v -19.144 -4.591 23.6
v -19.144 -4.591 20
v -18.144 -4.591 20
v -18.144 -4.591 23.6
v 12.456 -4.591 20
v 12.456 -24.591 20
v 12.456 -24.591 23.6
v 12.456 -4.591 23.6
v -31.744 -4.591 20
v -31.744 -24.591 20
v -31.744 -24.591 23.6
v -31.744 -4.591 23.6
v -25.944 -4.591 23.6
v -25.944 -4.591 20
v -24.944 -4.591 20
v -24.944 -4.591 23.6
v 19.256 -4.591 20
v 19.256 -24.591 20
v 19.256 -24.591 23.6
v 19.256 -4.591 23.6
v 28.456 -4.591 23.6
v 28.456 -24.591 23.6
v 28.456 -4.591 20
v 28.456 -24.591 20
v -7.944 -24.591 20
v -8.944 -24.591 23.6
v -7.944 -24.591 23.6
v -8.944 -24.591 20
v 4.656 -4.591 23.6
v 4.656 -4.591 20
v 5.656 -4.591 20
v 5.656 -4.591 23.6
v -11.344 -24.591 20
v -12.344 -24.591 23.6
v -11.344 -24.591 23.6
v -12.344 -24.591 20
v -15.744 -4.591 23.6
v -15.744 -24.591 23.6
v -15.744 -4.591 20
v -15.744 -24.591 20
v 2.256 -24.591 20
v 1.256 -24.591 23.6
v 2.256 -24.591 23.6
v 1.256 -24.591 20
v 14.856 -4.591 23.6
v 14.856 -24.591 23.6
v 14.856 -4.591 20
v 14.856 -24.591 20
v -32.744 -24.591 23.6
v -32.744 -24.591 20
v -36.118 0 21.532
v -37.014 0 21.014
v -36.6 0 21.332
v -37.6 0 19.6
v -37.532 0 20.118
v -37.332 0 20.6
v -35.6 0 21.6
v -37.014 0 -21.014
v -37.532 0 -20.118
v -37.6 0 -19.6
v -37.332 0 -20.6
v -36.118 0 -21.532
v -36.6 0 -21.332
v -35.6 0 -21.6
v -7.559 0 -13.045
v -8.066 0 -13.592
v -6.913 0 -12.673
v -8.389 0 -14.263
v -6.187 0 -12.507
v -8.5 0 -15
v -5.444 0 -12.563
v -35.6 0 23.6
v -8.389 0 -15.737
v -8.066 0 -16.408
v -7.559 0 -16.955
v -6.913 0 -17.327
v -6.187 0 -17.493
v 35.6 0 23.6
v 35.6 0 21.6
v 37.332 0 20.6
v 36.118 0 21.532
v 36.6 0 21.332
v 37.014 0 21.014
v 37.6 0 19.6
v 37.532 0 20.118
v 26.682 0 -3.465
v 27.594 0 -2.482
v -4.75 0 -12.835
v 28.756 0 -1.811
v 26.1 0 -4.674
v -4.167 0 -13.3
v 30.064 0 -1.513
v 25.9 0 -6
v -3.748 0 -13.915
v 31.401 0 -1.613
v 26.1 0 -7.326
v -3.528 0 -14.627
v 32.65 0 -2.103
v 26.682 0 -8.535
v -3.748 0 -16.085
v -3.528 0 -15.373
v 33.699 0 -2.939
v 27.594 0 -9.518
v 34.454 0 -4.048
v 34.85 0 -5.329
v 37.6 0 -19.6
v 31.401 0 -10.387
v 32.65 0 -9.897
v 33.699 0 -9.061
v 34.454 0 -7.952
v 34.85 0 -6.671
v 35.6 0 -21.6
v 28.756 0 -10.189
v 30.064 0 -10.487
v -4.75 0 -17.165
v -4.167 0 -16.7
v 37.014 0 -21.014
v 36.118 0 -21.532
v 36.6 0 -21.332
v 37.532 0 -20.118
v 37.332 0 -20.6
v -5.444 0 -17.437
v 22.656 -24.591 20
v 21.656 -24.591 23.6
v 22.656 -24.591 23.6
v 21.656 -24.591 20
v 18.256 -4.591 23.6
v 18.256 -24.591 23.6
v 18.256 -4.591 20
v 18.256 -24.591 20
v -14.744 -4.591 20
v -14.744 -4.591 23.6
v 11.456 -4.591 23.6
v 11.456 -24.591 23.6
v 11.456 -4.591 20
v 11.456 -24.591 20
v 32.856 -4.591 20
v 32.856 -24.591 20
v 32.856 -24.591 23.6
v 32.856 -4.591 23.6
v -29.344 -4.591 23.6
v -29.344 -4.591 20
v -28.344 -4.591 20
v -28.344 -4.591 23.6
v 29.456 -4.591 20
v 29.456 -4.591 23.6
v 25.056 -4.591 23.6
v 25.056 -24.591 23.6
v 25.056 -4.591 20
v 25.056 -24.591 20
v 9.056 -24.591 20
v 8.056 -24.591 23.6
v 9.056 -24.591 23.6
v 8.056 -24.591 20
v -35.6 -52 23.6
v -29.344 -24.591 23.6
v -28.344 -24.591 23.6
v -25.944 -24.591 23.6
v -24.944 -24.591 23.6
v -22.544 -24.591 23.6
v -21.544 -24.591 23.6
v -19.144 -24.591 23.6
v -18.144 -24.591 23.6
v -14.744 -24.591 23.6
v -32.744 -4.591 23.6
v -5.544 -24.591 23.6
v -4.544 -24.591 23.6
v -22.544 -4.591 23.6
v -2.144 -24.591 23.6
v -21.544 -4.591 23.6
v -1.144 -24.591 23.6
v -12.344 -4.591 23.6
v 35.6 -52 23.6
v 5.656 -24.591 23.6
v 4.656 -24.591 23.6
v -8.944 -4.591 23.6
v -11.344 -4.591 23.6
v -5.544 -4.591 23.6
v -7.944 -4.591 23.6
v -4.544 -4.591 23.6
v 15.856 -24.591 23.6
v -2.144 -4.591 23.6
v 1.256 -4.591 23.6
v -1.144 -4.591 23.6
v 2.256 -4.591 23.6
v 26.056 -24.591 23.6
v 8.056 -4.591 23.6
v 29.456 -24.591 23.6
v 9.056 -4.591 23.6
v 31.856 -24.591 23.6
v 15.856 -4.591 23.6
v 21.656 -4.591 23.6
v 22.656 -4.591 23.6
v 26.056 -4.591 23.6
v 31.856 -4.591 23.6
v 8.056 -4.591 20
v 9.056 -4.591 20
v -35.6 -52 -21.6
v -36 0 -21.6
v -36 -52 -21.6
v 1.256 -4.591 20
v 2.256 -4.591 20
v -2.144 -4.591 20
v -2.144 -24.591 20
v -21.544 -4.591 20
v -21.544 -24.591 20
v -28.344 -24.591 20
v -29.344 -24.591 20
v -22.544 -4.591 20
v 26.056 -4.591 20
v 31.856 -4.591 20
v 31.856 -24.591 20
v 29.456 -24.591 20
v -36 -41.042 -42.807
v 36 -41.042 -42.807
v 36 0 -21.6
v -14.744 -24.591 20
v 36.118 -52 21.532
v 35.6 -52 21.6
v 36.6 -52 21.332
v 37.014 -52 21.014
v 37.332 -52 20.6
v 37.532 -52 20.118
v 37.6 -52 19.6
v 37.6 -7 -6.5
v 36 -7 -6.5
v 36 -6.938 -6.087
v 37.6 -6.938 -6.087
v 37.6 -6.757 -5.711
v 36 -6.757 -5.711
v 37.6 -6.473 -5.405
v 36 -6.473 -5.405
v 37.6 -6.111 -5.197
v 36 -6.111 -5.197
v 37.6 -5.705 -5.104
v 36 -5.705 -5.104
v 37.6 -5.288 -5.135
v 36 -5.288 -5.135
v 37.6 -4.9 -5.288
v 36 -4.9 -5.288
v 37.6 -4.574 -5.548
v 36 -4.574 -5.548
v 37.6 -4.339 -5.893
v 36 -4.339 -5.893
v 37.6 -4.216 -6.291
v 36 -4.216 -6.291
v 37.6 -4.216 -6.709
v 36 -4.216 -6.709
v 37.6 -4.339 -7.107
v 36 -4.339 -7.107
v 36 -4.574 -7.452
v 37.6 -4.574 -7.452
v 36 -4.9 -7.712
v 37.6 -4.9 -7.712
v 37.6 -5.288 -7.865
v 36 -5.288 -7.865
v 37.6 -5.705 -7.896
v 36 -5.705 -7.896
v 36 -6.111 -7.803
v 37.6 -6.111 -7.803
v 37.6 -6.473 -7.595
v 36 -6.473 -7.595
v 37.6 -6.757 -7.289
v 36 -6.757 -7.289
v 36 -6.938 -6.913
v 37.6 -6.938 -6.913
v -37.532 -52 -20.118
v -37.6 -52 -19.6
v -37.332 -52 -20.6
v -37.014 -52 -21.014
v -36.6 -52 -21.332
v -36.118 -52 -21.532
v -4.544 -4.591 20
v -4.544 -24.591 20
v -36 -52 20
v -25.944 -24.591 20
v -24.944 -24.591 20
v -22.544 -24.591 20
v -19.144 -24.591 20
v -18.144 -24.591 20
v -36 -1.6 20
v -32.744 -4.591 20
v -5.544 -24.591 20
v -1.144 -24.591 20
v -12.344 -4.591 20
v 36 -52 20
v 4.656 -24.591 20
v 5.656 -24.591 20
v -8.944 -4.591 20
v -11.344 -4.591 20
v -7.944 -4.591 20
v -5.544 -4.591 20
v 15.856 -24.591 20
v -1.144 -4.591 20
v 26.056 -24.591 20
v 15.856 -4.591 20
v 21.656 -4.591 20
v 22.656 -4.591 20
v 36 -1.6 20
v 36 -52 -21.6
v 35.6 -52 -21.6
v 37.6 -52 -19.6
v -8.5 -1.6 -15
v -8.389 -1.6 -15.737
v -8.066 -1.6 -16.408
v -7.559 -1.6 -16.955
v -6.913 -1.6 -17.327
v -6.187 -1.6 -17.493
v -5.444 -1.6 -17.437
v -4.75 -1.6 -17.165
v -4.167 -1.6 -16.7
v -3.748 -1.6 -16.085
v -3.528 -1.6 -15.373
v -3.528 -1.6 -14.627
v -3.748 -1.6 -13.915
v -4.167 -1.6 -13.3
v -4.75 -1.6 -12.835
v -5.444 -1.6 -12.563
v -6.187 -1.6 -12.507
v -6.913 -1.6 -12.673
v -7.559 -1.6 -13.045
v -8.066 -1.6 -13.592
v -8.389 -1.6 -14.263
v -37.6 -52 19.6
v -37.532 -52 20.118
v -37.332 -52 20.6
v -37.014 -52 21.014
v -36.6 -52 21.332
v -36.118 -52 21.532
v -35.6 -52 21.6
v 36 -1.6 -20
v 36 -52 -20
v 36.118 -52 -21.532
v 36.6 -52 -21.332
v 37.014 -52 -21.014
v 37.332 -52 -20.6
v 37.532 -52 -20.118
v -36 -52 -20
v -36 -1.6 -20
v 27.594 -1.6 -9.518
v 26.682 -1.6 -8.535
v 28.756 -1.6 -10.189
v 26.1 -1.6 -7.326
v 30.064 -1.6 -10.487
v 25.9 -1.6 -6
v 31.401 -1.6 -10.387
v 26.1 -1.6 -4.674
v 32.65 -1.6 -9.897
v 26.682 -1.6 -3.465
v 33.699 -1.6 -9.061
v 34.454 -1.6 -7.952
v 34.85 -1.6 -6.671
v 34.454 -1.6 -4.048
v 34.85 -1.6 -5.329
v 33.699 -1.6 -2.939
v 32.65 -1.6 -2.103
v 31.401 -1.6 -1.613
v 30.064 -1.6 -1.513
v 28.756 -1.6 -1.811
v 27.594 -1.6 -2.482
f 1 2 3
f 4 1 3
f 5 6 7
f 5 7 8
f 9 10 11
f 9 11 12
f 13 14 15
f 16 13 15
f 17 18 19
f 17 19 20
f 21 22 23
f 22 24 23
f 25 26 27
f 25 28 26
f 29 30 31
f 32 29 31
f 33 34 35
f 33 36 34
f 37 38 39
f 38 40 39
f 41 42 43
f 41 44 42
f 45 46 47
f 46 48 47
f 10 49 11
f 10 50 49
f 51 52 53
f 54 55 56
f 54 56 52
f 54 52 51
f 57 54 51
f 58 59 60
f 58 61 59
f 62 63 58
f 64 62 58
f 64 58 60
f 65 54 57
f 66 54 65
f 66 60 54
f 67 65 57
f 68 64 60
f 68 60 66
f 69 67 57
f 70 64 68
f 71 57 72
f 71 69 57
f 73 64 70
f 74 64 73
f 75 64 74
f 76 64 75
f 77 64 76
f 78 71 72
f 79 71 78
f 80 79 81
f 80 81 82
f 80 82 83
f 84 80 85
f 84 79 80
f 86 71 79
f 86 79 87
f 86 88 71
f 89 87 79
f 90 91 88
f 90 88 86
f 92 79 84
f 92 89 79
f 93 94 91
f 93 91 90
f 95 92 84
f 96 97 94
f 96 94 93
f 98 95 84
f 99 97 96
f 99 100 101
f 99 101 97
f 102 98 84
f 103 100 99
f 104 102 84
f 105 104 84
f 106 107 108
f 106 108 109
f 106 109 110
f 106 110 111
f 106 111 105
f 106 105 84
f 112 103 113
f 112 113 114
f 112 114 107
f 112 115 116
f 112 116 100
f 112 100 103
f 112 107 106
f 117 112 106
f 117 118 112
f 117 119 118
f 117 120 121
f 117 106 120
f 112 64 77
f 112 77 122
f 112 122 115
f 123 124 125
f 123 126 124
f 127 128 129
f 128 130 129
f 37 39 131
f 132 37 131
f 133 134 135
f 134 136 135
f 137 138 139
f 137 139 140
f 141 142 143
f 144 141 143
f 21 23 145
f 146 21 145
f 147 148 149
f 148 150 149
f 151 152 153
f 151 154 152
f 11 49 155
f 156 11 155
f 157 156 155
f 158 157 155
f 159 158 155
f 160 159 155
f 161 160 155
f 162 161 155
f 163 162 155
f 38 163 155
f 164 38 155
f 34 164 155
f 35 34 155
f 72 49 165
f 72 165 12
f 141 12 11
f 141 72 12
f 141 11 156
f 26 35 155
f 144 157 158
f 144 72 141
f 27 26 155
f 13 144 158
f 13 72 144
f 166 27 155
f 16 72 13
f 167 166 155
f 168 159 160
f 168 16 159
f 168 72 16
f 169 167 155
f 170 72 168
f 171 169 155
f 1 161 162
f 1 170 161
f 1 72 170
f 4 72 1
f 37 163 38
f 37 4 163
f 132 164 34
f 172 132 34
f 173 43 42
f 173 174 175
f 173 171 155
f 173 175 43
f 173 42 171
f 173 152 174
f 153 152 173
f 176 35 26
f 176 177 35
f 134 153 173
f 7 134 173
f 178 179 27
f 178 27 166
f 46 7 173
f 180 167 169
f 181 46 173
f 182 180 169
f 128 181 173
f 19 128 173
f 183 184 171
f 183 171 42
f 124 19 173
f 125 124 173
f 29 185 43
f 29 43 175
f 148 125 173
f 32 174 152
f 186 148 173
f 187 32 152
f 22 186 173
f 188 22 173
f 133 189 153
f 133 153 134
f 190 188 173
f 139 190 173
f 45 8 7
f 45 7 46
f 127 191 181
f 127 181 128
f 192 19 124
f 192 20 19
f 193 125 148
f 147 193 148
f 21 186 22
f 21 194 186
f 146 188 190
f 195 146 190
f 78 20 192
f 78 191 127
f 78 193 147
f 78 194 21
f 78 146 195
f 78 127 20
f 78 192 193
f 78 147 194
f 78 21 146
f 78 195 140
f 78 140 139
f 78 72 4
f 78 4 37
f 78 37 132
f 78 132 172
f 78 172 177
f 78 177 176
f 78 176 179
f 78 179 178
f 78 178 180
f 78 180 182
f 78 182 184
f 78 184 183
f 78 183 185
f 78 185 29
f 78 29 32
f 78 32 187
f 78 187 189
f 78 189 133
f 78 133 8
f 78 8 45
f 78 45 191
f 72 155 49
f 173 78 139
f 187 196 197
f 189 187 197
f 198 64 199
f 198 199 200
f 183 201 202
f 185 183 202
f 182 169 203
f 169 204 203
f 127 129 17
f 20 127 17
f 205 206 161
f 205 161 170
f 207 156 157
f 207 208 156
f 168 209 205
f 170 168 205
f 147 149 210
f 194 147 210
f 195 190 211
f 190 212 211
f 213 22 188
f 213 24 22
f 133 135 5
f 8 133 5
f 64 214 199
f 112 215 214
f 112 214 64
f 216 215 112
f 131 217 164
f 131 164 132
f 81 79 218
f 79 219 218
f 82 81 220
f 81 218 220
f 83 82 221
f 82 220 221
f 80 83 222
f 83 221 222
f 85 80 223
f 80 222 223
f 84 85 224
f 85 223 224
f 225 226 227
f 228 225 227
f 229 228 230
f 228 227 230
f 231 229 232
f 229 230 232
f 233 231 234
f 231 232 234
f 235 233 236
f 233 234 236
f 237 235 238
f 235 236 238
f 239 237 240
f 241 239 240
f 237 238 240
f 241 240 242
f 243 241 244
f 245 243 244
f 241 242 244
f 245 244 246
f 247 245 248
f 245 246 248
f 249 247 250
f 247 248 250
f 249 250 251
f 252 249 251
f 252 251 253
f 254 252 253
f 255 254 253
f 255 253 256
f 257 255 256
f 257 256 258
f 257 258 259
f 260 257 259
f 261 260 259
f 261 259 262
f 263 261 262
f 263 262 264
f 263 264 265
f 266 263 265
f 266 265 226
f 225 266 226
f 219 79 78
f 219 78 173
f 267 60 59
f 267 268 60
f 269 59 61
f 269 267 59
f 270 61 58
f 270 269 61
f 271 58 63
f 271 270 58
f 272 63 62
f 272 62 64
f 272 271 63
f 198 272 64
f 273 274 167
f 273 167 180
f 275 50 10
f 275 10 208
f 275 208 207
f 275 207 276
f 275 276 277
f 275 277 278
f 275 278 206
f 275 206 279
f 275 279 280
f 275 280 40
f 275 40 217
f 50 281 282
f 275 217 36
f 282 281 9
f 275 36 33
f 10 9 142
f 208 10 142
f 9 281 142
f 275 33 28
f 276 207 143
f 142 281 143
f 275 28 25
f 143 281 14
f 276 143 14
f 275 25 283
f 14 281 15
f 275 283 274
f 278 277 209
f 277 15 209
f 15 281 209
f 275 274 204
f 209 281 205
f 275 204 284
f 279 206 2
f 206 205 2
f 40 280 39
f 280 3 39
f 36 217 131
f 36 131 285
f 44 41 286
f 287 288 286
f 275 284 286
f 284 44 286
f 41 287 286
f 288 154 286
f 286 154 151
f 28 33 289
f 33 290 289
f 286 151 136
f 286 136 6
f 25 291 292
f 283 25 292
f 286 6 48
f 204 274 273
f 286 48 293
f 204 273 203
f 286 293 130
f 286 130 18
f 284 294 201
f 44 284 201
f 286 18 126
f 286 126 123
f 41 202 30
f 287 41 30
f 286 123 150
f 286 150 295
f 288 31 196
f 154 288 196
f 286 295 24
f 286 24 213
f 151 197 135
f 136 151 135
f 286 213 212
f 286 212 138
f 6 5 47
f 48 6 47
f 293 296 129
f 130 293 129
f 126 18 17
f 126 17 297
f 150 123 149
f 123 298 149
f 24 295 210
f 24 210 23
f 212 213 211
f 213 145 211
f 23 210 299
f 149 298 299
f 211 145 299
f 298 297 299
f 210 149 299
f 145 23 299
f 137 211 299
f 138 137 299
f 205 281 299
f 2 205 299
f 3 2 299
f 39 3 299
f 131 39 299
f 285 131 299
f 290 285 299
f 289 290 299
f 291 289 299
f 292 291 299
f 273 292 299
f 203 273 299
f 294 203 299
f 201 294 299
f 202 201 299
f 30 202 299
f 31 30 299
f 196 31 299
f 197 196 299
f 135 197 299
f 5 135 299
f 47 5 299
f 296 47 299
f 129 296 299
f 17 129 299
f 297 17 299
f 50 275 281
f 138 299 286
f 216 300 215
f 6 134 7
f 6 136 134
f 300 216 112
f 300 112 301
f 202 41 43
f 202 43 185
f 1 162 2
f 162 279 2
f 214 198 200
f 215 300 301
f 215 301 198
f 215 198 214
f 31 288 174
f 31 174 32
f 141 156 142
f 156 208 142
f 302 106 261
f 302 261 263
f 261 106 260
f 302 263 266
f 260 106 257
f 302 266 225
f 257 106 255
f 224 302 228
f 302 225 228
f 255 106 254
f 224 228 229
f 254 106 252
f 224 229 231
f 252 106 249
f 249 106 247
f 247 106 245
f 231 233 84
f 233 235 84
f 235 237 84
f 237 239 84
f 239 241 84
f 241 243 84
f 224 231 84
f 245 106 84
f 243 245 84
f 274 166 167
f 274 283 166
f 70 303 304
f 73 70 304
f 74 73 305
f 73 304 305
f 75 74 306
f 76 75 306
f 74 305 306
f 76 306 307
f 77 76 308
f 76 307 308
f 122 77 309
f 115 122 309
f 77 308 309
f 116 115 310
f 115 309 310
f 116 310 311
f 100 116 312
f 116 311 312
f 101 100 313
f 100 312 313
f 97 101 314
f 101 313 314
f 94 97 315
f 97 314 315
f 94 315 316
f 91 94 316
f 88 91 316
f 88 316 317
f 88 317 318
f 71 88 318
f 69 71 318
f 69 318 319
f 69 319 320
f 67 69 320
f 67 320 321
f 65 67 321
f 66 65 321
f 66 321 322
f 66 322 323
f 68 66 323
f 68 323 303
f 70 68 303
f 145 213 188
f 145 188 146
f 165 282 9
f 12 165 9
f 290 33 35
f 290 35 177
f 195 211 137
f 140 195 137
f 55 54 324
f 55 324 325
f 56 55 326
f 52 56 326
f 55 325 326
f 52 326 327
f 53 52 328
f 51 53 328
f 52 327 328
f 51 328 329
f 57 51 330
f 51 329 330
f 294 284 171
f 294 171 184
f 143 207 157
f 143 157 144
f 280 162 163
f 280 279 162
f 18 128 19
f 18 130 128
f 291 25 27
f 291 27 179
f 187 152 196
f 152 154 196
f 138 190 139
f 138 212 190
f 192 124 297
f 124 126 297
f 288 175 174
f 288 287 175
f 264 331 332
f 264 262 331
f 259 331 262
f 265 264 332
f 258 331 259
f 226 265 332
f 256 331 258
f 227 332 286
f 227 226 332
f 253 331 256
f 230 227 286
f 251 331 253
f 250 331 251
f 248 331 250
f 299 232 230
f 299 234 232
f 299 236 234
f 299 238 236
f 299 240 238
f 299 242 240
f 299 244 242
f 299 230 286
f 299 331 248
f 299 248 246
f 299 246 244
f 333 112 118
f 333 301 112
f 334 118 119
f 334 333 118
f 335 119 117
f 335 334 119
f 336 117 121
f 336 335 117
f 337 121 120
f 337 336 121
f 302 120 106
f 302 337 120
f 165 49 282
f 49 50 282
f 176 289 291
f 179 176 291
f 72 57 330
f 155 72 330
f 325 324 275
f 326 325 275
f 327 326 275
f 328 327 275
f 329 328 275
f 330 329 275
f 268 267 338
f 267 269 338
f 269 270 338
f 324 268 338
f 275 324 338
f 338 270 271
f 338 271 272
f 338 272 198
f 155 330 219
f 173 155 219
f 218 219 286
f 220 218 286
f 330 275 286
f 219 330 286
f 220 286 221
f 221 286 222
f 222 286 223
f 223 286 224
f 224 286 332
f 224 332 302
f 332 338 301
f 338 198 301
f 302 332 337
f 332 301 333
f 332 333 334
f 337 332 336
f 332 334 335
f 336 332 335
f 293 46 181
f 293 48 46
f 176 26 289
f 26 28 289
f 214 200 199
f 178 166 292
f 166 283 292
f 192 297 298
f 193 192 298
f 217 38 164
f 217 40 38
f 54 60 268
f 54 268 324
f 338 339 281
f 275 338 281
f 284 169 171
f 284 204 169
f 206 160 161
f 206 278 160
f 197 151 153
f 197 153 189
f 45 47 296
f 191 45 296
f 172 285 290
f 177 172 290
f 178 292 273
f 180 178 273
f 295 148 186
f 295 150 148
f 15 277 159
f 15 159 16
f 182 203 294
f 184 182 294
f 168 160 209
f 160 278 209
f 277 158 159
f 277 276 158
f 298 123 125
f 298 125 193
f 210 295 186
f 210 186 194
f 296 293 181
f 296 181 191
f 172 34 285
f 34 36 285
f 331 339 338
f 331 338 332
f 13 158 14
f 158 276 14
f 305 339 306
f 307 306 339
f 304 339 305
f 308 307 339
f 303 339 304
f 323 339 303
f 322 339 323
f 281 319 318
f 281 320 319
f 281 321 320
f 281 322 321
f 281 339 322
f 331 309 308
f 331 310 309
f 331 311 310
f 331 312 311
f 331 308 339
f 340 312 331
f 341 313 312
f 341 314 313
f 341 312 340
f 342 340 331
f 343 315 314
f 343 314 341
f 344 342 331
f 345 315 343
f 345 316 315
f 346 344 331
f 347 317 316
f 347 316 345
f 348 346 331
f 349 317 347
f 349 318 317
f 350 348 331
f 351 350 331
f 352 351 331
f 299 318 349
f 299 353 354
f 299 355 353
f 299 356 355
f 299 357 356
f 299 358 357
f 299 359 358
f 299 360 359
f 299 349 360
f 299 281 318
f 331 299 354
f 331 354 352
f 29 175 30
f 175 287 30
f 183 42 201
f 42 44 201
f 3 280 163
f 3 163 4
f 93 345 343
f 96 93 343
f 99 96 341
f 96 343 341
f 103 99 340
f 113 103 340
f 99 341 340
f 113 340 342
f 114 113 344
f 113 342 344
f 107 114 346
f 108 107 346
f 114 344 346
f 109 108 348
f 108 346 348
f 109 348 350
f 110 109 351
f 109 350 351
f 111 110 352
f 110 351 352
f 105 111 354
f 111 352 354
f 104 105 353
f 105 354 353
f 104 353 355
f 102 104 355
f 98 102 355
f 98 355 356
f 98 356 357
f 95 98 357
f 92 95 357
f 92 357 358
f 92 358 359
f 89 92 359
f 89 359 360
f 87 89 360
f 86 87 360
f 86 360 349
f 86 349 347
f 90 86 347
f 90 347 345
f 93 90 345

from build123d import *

# Parameters (mm, degrees)
F0_W      = 75.2
F0_H      = 43.2
F0_W_2    = 72
F0_H_2    = 40
F1_DEPTH  = 52
F2_R      = 2
F3_DEPTH  = 1.6
F5_DEPTH  = 36
F6_D      = 9
F8_D      = 2.8
F8_DEPTH  = 1.601
F9_D      = 5
F10_W     = 1
F10_H     = 20
F11_DEPTH = 25
F12_DEPTH = 2


with BuildPart() as f1:
    # F0 (on Front) → F1 (new body)
    with BuildSketch(Plane.XZ):
        Rectangle(F0_W, F0_H)
        Rectangle(F0_W_2, F0_H_2, mode=Mode.SUBTRACT)
    extrude(amount=F1_DEPTH)

    # F2
    f2_edges = [f1.edges().sort_by_distance(p)[0] for p in [
        (37.6, -26, 21.6),
        (-37.6, -26, 21.6),
        (-37.6, -26, -21.6),
        (37.6, -26, -21.6),
    ]]
    fillet(f2_edges, radius=F2_R)

    # F0 (on Front) → F3 (join)
    with BuildSketch(Plane.XZ):
        Rectangle(F0_W_2, F0_H_2)
    extrude(amount=F3_DEPTH)

    # F4 (on Right) → F5 (join, symmetric)
    with BuildSketch(Plane.YZ):
        Polygon((0, -21.6), (-52, -21.6), (-41.0421315348, -42.8069394041), align=None)
    extrude(amount=F5_DEPTH, both=True)

    # F6 (through all)
    with Locations(Plane(origin=(0, 0, 0), x_dir=(1, 0, 0), z_dir=(0, 1, 0))):
        with Locations((30.4, 6)):
            Hole(F6_D / 2)

    # F8 (through all, one way)
    with BuildSketch(Plane(origin=(36, 0, 0), x_dir=(0, -1, 0), z_dir=(-1, 0, 0))):
        with Locations((5.6, -6.5)):
            Circle(F8_D / 2)
    extrude(amount=-F8_DEPTH, mode=Mode.SUBTRACT)

    # F9 (through all)
    with Locations(Plane(origin=(0, 0, 0), x_dir=(1, 0, 0), z_dir=(0, 1, 0))):
        with Locations((-6, 15)):
            Hole(F9_D / 2)

    # F10 (on face) → F11 (cut)
    with BuildSketch(Plane.XY.offset(21.6)):
        with Locations((-32.2436588705, -14.5910207555)):
            Rectangle(F10_W, F10_H)
        with Locations((-28.8436588705, -14.5910207555)):
            Rectangle(F10_W, F10_H)
        with Locations((-25.4436588705, -14.5910207555)):
            Rectangle(F10_W, F10_H)
        with Locations((-22.0436588705, -14.5910207555)):
            Rectangle(F10_W, F10_H)
        with Locations((-18.6436588705, -14.5910207555)):
            Rectangle(F10_W, F10_H)
        with Locations((-15.2436588705, -14.5910207555)):
            Rectangle(F10_W, F10_H)
        with Locations((-11.8436588705, -14.5910207555)):
            Rectangle(F10_W, F10_H)
        with Locations((-8.4436588705, -14.5910207555)):
            Rectangle(F10_W, F10_H)
        with Locations((-5.0436588705, -14.5910207555)):
            Rectangle(F10_W, F10_H)
        with Locations((1.7563411295, -14.5910207555)):
            Rectangle(F10_W, F10_H)
        with Locations((5.1563411295, -14.5910207555)):
            Rectangle(F10_W, F10_H)
        with Locations((-1.6436588705, -14.5910207555)):
            Rectangle(F10_W, F10_H)
        with Locations((8.5563411295, -14.5910207555)):
            Rectangle(F10_W, F10_H)
        with Locations((11.9563411295, -14.5910207555)):
            Rectangle(F10_W, F10_H)
        with Locations((15.3563411295, -14.5910207555)):
            Rectangle(F10_W, F10_H)
        with Locations((18.7563411295, -14.5910207555)):
            Rectangle(F10_W, F10_H)
        with Locations((22.1563411295, -14.5910207555)):
            Rectangle(F10_W, F10_H)
        with Locations((25.5563411295, -14.5910207555)):
            Rectangle(F10_W, F10_H)
        with Locations((28.9563411295, -14.5910207555)):
            Rectangle(F10_W, F10_H)
        with Locations((32.3563411295, -14.5910207555)):
            Rectangle(F10_W, F10_H)
    extrude(amount=-F11_DEPTH, mode=Mode.SUBTRACT)

    # F12 (add): a face of the model
    f12_faces = [f1.faces().sort_by_distance(p)[0] for p in [
        (-0.0068242647, -27.3819015558, 21.6),
    ]]
    extrude(f12_faces, amount=F12_DEPTH)


solid = f1.part
